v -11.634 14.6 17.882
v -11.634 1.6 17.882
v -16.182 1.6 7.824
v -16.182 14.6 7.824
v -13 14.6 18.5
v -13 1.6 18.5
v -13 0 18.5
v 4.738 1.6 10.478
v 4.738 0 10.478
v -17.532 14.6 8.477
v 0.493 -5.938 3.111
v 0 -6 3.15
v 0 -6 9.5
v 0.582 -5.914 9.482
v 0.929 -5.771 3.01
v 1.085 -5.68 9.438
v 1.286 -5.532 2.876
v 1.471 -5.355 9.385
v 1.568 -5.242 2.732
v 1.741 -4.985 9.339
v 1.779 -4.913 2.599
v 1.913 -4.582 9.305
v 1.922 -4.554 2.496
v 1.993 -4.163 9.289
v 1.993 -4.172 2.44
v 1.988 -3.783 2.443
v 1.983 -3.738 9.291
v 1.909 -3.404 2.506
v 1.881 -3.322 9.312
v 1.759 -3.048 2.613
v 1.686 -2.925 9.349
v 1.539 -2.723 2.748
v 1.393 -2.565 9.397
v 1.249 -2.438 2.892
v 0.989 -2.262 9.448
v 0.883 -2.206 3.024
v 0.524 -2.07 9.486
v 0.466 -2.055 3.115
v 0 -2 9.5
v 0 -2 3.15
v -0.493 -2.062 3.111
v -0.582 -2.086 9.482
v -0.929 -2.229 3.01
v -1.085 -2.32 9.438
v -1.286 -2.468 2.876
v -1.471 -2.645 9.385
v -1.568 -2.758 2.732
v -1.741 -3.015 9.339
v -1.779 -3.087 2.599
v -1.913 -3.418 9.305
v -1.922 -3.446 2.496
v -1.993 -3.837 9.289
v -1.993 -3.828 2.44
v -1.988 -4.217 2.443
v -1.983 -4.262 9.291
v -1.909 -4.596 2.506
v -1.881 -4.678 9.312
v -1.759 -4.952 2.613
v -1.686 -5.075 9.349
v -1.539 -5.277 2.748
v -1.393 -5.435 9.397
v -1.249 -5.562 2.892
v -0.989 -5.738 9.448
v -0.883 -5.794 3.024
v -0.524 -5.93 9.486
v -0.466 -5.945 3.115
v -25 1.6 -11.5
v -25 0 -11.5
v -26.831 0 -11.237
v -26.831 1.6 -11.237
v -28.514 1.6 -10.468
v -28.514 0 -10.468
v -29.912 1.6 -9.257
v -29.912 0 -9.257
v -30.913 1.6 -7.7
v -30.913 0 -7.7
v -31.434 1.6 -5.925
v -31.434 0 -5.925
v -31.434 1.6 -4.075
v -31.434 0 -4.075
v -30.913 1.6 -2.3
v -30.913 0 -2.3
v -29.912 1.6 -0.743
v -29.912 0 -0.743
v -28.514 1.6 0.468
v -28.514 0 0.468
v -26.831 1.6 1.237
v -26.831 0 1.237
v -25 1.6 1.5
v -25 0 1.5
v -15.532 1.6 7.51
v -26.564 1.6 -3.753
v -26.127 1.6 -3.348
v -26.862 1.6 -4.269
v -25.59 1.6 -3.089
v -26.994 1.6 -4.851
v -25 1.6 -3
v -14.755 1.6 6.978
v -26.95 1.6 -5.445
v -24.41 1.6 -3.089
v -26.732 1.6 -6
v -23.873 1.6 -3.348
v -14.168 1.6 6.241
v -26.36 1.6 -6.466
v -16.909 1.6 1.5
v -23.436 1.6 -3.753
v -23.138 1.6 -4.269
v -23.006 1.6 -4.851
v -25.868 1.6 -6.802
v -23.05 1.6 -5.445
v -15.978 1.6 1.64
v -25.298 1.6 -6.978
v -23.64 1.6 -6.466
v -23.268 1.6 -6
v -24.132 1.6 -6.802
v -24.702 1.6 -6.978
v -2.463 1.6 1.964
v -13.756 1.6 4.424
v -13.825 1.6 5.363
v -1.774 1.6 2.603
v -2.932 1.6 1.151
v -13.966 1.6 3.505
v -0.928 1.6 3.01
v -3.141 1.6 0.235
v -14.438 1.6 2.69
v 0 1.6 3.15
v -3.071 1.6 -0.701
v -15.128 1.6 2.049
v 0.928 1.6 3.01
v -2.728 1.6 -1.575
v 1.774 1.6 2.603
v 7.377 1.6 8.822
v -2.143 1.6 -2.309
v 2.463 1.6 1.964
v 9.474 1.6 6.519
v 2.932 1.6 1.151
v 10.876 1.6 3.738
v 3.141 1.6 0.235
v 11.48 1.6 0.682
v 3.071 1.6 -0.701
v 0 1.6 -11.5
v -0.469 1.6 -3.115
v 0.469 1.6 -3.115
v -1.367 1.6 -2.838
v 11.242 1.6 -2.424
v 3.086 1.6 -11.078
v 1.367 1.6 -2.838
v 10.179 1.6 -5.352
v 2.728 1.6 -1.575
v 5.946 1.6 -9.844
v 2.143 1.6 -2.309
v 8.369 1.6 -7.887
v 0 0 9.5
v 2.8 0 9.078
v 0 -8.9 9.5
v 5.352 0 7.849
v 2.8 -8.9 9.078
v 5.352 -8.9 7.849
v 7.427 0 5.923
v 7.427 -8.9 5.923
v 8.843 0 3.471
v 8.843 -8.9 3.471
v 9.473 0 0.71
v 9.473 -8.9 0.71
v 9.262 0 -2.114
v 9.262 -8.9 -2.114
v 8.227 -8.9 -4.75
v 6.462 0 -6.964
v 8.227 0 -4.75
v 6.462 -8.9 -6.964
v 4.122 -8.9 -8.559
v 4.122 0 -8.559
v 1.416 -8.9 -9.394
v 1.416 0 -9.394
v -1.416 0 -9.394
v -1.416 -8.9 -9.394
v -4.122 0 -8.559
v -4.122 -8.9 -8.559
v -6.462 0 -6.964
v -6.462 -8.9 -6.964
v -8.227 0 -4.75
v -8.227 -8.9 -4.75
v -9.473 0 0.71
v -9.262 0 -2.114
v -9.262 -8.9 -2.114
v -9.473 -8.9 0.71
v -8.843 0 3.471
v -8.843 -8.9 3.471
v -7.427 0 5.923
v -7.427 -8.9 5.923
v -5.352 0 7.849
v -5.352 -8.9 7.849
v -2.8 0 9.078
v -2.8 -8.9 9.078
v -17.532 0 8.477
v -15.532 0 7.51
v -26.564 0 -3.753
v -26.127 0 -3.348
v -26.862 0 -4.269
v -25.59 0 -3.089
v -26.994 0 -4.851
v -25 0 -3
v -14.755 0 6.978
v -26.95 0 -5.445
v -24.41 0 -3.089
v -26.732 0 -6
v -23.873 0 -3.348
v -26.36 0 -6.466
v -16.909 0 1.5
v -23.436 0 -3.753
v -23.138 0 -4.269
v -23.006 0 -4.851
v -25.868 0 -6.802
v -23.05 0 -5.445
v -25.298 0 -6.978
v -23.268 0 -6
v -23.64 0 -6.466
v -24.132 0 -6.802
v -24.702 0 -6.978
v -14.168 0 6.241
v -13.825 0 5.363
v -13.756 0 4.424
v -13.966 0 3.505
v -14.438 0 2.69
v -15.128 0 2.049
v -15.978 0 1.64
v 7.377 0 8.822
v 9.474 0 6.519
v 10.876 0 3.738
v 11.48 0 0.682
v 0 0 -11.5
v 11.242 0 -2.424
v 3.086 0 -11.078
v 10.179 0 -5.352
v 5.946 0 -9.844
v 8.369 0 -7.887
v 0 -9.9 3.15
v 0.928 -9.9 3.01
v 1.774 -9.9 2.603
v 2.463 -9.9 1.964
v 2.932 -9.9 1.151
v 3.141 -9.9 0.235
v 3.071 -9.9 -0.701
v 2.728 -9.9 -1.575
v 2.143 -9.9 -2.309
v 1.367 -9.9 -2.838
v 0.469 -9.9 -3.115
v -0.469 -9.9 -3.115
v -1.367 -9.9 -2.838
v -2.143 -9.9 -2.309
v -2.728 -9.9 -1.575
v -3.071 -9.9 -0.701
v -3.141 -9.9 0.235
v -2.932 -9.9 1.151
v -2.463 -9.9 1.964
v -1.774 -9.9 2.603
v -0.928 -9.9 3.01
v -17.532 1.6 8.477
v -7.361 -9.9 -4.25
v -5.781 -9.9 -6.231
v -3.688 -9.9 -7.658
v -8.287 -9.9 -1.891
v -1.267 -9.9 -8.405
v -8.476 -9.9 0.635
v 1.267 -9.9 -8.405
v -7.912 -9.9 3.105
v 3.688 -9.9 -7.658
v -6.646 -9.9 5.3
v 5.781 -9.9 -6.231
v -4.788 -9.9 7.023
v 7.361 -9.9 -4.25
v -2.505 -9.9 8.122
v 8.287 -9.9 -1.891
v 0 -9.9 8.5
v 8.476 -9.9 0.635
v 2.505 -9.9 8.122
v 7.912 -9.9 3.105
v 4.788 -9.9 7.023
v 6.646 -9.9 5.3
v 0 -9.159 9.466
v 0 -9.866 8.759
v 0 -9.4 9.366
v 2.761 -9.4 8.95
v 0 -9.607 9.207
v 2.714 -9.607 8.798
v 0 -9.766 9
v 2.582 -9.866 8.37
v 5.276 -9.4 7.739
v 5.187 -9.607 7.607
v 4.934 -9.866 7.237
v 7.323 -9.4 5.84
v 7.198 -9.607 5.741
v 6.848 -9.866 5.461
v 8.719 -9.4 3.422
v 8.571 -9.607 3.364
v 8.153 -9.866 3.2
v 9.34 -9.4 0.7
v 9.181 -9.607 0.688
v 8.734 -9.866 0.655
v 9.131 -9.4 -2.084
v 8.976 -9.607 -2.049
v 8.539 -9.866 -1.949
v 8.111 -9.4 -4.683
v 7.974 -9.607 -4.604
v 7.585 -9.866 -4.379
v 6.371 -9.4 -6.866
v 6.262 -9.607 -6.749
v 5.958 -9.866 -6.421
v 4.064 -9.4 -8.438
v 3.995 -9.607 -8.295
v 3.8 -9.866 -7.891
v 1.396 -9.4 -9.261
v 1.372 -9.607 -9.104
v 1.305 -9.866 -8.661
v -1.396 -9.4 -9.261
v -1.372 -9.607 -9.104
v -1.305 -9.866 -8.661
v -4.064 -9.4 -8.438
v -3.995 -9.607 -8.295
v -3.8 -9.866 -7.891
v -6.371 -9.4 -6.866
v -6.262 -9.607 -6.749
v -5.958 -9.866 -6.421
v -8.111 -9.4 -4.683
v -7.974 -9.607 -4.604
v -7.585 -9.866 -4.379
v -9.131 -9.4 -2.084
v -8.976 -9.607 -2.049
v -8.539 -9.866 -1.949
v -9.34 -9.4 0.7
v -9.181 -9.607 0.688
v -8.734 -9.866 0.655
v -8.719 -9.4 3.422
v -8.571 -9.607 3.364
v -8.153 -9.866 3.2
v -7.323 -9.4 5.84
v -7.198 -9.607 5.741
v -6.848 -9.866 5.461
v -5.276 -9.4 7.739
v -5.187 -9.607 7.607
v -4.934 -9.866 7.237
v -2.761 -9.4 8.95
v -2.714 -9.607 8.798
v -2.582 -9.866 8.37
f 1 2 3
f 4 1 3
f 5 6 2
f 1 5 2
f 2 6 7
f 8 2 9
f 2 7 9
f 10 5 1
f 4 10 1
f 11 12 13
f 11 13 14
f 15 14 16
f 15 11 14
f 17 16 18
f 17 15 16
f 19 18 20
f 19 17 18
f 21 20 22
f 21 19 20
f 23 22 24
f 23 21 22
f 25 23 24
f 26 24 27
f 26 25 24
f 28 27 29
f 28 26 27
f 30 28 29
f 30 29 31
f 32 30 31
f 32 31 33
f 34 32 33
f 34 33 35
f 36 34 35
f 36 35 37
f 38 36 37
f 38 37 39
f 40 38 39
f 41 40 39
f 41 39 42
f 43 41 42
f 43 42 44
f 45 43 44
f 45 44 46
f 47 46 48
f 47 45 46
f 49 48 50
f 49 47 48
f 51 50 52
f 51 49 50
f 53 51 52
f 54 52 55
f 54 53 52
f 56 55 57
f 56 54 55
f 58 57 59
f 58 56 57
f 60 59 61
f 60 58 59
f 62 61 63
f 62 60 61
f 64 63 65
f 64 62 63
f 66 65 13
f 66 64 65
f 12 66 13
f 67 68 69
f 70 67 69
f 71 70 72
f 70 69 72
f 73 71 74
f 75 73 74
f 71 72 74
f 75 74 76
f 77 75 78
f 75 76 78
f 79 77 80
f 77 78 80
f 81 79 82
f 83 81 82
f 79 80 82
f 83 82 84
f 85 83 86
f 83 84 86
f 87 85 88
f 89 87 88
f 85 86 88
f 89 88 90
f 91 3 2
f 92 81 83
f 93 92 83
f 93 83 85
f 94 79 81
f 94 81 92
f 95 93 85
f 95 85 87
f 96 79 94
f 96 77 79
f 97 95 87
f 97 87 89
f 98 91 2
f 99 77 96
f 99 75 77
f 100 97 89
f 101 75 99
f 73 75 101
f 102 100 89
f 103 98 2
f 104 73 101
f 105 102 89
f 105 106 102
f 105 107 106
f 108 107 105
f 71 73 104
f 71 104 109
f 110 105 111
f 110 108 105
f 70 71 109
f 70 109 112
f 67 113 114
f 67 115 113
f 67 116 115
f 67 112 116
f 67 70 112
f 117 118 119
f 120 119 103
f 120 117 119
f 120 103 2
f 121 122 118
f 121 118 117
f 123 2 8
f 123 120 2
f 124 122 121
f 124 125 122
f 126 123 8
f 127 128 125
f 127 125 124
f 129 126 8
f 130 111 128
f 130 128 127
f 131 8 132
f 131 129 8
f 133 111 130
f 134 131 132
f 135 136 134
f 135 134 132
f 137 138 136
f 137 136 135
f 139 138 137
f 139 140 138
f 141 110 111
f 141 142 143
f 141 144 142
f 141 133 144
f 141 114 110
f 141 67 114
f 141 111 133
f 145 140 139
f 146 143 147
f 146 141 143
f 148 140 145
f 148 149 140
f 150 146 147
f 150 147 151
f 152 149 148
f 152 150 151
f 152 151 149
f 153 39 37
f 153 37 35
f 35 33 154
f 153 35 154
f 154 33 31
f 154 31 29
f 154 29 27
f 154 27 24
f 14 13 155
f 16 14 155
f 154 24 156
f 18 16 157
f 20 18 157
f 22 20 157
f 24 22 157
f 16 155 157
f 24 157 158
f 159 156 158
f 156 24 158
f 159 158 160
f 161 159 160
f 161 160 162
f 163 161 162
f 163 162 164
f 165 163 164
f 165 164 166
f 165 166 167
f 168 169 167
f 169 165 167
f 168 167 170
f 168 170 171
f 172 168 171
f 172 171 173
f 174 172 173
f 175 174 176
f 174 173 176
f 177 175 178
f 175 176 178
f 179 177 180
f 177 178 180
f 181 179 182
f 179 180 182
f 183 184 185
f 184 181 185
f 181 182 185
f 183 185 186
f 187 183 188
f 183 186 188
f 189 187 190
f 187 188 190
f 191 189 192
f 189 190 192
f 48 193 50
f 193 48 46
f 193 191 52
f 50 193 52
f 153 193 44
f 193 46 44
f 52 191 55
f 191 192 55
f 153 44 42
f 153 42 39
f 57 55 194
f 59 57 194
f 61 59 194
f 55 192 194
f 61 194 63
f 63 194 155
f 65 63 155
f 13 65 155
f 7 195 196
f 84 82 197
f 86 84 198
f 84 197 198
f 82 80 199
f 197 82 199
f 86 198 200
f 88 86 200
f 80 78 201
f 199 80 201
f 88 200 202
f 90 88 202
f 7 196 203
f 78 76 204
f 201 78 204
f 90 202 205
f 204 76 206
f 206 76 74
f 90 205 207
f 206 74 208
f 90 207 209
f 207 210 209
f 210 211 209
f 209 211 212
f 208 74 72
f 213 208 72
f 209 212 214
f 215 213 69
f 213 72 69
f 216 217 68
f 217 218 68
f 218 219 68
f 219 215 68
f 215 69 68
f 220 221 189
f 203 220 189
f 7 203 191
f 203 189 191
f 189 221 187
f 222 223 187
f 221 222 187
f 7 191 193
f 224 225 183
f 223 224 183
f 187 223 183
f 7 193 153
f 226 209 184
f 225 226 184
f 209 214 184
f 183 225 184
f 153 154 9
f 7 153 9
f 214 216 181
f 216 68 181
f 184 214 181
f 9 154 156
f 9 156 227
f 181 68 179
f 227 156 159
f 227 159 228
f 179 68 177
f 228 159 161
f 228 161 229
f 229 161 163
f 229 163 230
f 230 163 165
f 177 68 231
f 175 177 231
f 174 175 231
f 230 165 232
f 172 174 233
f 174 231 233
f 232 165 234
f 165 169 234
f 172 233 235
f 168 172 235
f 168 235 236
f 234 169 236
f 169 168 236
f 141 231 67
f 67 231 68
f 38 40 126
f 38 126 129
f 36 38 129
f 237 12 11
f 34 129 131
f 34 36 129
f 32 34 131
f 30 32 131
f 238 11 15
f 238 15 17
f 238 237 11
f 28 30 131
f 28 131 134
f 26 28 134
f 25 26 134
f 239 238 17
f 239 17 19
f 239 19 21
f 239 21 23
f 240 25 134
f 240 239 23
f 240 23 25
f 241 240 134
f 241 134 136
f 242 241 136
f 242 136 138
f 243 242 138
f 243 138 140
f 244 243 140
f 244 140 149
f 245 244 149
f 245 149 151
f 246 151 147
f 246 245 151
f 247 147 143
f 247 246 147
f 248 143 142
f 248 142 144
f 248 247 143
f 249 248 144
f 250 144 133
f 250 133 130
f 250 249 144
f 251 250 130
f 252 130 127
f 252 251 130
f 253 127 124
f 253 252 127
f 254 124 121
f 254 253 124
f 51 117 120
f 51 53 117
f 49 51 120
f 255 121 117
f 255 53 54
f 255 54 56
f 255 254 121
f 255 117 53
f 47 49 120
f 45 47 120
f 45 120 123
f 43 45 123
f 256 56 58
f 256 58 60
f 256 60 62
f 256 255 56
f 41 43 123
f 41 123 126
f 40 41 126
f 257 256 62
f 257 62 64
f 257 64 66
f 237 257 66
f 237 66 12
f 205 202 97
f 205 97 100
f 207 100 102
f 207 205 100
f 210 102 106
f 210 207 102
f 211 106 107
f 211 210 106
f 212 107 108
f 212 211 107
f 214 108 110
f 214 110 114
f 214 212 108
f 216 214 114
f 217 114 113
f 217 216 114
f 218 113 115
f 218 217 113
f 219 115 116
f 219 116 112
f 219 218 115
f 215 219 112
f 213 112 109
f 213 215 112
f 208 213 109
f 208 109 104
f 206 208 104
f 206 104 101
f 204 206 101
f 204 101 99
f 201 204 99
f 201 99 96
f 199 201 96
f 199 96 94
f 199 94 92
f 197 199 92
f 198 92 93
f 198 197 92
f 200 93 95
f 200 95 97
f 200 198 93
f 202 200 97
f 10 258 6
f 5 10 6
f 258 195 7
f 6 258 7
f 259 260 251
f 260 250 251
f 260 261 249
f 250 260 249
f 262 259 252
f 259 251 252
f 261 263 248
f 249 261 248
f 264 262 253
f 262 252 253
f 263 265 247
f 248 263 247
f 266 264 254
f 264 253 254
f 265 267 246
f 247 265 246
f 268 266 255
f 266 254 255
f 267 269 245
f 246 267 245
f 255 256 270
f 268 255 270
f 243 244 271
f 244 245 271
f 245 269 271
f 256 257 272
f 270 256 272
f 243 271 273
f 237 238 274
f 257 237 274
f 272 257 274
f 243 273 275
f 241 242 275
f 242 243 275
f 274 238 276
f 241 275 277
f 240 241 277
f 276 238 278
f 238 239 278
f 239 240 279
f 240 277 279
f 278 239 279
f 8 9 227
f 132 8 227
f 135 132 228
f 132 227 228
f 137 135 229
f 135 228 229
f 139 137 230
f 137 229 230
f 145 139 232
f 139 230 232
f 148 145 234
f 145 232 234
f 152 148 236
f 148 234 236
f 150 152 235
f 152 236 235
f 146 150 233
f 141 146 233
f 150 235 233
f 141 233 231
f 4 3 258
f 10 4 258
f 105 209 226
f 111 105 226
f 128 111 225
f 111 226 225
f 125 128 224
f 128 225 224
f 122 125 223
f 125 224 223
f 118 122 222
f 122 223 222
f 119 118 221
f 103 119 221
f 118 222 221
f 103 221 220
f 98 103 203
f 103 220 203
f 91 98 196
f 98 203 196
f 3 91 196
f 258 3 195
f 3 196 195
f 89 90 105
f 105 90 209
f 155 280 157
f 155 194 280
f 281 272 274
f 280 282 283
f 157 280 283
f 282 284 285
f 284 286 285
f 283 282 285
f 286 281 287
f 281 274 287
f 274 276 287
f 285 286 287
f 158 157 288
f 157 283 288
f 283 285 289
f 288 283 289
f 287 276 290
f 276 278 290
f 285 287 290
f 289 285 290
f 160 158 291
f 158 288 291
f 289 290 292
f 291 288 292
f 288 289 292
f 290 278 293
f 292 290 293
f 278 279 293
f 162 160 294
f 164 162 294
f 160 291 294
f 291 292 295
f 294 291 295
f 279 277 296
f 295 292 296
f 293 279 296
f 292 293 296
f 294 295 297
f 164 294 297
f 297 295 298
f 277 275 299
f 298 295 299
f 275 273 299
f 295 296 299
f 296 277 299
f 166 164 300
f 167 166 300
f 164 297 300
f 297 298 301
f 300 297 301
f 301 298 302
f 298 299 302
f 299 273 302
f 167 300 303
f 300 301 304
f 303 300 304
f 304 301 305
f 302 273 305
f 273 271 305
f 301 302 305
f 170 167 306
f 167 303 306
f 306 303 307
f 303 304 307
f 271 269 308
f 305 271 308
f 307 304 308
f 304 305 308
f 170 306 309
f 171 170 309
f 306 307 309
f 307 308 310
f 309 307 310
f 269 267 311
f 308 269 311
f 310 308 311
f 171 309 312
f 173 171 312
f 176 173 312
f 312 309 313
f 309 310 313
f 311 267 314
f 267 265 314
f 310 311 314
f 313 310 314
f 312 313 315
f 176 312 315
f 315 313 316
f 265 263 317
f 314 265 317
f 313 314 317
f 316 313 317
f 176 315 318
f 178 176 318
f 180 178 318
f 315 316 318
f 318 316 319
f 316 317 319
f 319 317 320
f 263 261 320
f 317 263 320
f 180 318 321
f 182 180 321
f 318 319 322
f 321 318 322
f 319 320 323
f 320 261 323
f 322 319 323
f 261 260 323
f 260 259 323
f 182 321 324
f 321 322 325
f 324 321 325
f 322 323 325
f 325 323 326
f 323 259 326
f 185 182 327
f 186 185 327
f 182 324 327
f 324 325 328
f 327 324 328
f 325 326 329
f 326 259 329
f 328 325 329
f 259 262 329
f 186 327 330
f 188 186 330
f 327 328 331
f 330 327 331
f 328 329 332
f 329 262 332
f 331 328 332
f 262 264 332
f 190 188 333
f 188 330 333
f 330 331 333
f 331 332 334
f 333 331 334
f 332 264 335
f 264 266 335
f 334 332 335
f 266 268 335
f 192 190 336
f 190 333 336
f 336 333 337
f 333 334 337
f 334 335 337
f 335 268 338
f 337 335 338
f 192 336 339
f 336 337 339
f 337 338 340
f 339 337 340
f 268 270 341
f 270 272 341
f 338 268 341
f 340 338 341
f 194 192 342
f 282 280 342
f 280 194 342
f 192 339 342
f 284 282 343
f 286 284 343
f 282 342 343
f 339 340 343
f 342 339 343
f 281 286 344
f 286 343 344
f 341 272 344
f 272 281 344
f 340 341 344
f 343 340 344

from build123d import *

# Parameters (mm, degrees)
ESQUISSE1_R             = 3.15
ESQUISSE1_R_2           = 2
BOSS_EXTRU_1_DEPTH      = 1.6
BOSS_EXTRU_2_START      = -11.5
ESQUISSE2_R             = 9.5
ESQUISSE2_R_2           = 3.15
BOSS_EXTRU_2_DEPTH      = 11.5
CONG_1_R                = 1
BOSS_EXTRU_3_DEPTH      = 13
ESQUISSE4_R             = 2
ENL_V_MAT_EXTRU_1_DEPTH = 40.340310116


with BuildPart() as part:
    # Esquisse1 → Boss.-Extru.1 (new body)
    with BuildSketch(Plane(origin=(0, 0, 0), x_dir=(1, 0, 0), z_dir=(0, 1, 0))):
        with BuildLine():
            Line((0, 11.5), (-25, 11.5))
            ThreePointArc((-25, 11.5), (-31.5, 5), (-25, -1.5))
            Line((-25, -1.5), (-16.90921754, -1.5))
            ThreePointArc((-16.90921754, -1.5), (-13.826301978, -3.956560509), (-15.532463951, -7.510159982))
            Line((-15.532463951, -7.510159982), (-17.532463951, -8.477187494))
            Line((-17.532463951, -8.477187494), (-13, -18.5))
            Line((-13, -18.5), (4.73848504, -10.478394893))
            ThreePointArc((4.73848504, -10.478394893), (11.241697854, 2.423680954), (0, 11.5))
        make_face()
        with Locations(Location((0, 0, 0), (0, 0, 270))):
            Circle(ESQUISSE1_R, mode=Mode.SUBTRACT)
        with Locations(Location((-25, 5, 0), (0, 0, 270))):
            Circle(ESQUISSE1_R_2, mode=Mode.SUBTRACT)
    extrude(amount=BOSS_EXTRU_1_DEPTH)

    # Esquisse2 → Boss.-Extru.2 (add)
    with BuildSketch(Plane(origin=(0, 1.6, 0), x_dir=(1, 0, 0), z_dir=(0, 1, 0)).offset(BOSS_EXTRU_2_START)):
        with Locations(Location((0, 0, 0), (0, 0, 270))):
            Circle(ESQUISSE2_R)
        with Locations(Location((0, 0, 0), (0, 0, 270))):
            Circle(ESQUISSE2_R_2, mode=Mode.SUBTRACT)
    extrude(amount=BOSS_EXTRU_2_DEPTH)

    # Congé1
    cong_1_edges = [part.edges().sort_by_distance(p)[0] for p in [
        (0, -9.9, -9.5),
    ]]
    fillet(cong_1_edges, radius=CONG_1_R)

    # Esquisse3 → Boss.-Extru.3 (add)
    with BuildSketch(Plane(origin=(0, 1.6, 0), x_dir=(1, 0, 0), z_dir=(0, 1, 0))):
        Polygon((-17.532463951, -8.477187494), (-13, -18.5), (-11.633703391, -17.88214048), (-16.182035998, -7.824237002), align=None)
    extrude(amount=BOSS_EXTRU_3_DEPTH)

    # Esquisse4 → Enlèv. mat.-Extru.1 (cut, through all)
    with BuildSketch(Plane.XY):
        with Locations(Location((0, -4, 0), (0, 0, 269.999999976))):
            Circle(ESQUISSE4_R)
    extrude(amount=ENL_V_MAT_EXTRU_1_DEPTH, mode=Mode.SUBTRACT)


solid = part.part
